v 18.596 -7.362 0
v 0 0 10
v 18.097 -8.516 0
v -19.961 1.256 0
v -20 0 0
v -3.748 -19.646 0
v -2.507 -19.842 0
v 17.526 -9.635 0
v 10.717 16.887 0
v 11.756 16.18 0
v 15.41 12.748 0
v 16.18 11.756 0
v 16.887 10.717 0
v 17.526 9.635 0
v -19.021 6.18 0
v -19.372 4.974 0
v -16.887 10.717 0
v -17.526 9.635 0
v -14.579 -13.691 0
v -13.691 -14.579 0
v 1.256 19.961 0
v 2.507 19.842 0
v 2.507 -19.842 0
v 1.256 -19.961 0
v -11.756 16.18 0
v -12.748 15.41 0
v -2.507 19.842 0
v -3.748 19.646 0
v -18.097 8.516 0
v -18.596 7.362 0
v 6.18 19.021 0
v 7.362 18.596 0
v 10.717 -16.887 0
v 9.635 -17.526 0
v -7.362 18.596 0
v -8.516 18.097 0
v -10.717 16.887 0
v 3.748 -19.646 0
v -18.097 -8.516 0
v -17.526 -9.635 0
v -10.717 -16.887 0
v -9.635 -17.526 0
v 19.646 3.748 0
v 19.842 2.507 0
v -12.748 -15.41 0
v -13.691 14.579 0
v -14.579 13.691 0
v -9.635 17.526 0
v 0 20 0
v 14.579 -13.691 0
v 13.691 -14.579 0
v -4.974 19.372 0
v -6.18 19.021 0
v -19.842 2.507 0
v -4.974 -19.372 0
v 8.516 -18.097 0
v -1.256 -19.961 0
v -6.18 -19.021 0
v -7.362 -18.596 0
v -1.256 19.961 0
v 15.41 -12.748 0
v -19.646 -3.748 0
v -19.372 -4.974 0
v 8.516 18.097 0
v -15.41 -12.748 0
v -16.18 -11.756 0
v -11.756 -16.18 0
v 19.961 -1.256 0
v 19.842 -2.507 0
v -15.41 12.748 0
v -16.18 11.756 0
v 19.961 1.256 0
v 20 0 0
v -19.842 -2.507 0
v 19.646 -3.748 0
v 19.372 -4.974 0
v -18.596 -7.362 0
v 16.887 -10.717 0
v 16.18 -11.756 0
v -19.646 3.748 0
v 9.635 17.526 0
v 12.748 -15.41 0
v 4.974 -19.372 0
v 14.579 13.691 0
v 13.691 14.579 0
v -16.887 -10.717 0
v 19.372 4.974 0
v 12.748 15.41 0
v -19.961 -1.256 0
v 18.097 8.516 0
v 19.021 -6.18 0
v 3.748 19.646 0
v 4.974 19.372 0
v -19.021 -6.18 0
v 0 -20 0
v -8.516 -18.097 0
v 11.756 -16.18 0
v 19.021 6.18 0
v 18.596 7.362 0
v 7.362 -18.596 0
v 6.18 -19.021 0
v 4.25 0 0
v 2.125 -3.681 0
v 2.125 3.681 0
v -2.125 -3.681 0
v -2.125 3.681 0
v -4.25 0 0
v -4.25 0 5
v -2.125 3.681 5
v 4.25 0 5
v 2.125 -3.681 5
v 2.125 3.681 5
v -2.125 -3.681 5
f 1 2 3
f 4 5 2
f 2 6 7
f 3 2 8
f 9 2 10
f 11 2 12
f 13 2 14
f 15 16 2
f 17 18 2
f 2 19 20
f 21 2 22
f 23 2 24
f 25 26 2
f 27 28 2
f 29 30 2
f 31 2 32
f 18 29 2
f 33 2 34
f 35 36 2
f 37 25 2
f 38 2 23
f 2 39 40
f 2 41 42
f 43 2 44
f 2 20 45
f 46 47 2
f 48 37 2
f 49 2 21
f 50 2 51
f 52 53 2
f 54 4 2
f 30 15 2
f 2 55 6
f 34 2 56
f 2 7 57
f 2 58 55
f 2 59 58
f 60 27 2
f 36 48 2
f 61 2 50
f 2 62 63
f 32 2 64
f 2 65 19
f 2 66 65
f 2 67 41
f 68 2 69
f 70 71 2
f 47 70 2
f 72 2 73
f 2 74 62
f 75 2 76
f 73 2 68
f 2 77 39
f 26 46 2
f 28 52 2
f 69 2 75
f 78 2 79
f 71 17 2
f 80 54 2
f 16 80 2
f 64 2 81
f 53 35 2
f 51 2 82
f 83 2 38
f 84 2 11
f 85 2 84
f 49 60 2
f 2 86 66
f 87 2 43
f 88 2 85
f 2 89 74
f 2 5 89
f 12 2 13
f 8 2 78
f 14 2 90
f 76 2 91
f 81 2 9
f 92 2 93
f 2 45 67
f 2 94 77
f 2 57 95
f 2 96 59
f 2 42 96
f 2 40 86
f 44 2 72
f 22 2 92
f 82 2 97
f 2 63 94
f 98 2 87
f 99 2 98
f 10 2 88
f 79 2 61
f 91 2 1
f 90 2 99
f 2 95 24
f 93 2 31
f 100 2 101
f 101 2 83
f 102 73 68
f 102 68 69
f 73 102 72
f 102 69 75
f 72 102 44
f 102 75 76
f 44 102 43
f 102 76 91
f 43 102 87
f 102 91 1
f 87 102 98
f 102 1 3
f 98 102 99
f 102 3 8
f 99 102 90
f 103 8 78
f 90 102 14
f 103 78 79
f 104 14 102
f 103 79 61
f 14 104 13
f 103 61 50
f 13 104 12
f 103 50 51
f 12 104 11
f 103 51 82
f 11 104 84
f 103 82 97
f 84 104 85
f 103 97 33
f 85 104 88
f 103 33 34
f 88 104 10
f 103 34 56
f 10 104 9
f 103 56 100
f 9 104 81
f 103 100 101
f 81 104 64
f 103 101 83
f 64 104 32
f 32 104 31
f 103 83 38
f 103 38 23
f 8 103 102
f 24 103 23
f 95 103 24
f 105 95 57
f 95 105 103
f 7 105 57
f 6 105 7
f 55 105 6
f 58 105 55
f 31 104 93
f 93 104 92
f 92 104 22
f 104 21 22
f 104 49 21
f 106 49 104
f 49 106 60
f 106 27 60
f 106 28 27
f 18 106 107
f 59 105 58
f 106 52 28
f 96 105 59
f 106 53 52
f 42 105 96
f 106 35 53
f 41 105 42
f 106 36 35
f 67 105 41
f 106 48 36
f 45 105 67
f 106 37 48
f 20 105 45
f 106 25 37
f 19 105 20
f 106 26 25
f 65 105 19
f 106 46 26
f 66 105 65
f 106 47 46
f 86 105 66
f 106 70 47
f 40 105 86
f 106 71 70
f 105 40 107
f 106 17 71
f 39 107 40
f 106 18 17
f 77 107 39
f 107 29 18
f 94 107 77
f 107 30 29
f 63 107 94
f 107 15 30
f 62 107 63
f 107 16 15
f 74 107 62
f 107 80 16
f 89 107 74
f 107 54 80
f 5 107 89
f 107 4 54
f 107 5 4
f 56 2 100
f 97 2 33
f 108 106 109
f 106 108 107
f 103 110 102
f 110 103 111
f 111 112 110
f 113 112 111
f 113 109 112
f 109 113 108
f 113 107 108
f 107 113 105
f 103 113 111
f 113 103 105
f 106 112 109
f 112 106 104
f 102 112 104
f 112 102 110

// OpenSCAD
$fn=100;
difference () {
    rotate_extrude () {
        polygon (points = [[0,0], [20,0], [0,10]]);
    }
    linear_extrude (5) circle (4.25, $fn=6);
}
